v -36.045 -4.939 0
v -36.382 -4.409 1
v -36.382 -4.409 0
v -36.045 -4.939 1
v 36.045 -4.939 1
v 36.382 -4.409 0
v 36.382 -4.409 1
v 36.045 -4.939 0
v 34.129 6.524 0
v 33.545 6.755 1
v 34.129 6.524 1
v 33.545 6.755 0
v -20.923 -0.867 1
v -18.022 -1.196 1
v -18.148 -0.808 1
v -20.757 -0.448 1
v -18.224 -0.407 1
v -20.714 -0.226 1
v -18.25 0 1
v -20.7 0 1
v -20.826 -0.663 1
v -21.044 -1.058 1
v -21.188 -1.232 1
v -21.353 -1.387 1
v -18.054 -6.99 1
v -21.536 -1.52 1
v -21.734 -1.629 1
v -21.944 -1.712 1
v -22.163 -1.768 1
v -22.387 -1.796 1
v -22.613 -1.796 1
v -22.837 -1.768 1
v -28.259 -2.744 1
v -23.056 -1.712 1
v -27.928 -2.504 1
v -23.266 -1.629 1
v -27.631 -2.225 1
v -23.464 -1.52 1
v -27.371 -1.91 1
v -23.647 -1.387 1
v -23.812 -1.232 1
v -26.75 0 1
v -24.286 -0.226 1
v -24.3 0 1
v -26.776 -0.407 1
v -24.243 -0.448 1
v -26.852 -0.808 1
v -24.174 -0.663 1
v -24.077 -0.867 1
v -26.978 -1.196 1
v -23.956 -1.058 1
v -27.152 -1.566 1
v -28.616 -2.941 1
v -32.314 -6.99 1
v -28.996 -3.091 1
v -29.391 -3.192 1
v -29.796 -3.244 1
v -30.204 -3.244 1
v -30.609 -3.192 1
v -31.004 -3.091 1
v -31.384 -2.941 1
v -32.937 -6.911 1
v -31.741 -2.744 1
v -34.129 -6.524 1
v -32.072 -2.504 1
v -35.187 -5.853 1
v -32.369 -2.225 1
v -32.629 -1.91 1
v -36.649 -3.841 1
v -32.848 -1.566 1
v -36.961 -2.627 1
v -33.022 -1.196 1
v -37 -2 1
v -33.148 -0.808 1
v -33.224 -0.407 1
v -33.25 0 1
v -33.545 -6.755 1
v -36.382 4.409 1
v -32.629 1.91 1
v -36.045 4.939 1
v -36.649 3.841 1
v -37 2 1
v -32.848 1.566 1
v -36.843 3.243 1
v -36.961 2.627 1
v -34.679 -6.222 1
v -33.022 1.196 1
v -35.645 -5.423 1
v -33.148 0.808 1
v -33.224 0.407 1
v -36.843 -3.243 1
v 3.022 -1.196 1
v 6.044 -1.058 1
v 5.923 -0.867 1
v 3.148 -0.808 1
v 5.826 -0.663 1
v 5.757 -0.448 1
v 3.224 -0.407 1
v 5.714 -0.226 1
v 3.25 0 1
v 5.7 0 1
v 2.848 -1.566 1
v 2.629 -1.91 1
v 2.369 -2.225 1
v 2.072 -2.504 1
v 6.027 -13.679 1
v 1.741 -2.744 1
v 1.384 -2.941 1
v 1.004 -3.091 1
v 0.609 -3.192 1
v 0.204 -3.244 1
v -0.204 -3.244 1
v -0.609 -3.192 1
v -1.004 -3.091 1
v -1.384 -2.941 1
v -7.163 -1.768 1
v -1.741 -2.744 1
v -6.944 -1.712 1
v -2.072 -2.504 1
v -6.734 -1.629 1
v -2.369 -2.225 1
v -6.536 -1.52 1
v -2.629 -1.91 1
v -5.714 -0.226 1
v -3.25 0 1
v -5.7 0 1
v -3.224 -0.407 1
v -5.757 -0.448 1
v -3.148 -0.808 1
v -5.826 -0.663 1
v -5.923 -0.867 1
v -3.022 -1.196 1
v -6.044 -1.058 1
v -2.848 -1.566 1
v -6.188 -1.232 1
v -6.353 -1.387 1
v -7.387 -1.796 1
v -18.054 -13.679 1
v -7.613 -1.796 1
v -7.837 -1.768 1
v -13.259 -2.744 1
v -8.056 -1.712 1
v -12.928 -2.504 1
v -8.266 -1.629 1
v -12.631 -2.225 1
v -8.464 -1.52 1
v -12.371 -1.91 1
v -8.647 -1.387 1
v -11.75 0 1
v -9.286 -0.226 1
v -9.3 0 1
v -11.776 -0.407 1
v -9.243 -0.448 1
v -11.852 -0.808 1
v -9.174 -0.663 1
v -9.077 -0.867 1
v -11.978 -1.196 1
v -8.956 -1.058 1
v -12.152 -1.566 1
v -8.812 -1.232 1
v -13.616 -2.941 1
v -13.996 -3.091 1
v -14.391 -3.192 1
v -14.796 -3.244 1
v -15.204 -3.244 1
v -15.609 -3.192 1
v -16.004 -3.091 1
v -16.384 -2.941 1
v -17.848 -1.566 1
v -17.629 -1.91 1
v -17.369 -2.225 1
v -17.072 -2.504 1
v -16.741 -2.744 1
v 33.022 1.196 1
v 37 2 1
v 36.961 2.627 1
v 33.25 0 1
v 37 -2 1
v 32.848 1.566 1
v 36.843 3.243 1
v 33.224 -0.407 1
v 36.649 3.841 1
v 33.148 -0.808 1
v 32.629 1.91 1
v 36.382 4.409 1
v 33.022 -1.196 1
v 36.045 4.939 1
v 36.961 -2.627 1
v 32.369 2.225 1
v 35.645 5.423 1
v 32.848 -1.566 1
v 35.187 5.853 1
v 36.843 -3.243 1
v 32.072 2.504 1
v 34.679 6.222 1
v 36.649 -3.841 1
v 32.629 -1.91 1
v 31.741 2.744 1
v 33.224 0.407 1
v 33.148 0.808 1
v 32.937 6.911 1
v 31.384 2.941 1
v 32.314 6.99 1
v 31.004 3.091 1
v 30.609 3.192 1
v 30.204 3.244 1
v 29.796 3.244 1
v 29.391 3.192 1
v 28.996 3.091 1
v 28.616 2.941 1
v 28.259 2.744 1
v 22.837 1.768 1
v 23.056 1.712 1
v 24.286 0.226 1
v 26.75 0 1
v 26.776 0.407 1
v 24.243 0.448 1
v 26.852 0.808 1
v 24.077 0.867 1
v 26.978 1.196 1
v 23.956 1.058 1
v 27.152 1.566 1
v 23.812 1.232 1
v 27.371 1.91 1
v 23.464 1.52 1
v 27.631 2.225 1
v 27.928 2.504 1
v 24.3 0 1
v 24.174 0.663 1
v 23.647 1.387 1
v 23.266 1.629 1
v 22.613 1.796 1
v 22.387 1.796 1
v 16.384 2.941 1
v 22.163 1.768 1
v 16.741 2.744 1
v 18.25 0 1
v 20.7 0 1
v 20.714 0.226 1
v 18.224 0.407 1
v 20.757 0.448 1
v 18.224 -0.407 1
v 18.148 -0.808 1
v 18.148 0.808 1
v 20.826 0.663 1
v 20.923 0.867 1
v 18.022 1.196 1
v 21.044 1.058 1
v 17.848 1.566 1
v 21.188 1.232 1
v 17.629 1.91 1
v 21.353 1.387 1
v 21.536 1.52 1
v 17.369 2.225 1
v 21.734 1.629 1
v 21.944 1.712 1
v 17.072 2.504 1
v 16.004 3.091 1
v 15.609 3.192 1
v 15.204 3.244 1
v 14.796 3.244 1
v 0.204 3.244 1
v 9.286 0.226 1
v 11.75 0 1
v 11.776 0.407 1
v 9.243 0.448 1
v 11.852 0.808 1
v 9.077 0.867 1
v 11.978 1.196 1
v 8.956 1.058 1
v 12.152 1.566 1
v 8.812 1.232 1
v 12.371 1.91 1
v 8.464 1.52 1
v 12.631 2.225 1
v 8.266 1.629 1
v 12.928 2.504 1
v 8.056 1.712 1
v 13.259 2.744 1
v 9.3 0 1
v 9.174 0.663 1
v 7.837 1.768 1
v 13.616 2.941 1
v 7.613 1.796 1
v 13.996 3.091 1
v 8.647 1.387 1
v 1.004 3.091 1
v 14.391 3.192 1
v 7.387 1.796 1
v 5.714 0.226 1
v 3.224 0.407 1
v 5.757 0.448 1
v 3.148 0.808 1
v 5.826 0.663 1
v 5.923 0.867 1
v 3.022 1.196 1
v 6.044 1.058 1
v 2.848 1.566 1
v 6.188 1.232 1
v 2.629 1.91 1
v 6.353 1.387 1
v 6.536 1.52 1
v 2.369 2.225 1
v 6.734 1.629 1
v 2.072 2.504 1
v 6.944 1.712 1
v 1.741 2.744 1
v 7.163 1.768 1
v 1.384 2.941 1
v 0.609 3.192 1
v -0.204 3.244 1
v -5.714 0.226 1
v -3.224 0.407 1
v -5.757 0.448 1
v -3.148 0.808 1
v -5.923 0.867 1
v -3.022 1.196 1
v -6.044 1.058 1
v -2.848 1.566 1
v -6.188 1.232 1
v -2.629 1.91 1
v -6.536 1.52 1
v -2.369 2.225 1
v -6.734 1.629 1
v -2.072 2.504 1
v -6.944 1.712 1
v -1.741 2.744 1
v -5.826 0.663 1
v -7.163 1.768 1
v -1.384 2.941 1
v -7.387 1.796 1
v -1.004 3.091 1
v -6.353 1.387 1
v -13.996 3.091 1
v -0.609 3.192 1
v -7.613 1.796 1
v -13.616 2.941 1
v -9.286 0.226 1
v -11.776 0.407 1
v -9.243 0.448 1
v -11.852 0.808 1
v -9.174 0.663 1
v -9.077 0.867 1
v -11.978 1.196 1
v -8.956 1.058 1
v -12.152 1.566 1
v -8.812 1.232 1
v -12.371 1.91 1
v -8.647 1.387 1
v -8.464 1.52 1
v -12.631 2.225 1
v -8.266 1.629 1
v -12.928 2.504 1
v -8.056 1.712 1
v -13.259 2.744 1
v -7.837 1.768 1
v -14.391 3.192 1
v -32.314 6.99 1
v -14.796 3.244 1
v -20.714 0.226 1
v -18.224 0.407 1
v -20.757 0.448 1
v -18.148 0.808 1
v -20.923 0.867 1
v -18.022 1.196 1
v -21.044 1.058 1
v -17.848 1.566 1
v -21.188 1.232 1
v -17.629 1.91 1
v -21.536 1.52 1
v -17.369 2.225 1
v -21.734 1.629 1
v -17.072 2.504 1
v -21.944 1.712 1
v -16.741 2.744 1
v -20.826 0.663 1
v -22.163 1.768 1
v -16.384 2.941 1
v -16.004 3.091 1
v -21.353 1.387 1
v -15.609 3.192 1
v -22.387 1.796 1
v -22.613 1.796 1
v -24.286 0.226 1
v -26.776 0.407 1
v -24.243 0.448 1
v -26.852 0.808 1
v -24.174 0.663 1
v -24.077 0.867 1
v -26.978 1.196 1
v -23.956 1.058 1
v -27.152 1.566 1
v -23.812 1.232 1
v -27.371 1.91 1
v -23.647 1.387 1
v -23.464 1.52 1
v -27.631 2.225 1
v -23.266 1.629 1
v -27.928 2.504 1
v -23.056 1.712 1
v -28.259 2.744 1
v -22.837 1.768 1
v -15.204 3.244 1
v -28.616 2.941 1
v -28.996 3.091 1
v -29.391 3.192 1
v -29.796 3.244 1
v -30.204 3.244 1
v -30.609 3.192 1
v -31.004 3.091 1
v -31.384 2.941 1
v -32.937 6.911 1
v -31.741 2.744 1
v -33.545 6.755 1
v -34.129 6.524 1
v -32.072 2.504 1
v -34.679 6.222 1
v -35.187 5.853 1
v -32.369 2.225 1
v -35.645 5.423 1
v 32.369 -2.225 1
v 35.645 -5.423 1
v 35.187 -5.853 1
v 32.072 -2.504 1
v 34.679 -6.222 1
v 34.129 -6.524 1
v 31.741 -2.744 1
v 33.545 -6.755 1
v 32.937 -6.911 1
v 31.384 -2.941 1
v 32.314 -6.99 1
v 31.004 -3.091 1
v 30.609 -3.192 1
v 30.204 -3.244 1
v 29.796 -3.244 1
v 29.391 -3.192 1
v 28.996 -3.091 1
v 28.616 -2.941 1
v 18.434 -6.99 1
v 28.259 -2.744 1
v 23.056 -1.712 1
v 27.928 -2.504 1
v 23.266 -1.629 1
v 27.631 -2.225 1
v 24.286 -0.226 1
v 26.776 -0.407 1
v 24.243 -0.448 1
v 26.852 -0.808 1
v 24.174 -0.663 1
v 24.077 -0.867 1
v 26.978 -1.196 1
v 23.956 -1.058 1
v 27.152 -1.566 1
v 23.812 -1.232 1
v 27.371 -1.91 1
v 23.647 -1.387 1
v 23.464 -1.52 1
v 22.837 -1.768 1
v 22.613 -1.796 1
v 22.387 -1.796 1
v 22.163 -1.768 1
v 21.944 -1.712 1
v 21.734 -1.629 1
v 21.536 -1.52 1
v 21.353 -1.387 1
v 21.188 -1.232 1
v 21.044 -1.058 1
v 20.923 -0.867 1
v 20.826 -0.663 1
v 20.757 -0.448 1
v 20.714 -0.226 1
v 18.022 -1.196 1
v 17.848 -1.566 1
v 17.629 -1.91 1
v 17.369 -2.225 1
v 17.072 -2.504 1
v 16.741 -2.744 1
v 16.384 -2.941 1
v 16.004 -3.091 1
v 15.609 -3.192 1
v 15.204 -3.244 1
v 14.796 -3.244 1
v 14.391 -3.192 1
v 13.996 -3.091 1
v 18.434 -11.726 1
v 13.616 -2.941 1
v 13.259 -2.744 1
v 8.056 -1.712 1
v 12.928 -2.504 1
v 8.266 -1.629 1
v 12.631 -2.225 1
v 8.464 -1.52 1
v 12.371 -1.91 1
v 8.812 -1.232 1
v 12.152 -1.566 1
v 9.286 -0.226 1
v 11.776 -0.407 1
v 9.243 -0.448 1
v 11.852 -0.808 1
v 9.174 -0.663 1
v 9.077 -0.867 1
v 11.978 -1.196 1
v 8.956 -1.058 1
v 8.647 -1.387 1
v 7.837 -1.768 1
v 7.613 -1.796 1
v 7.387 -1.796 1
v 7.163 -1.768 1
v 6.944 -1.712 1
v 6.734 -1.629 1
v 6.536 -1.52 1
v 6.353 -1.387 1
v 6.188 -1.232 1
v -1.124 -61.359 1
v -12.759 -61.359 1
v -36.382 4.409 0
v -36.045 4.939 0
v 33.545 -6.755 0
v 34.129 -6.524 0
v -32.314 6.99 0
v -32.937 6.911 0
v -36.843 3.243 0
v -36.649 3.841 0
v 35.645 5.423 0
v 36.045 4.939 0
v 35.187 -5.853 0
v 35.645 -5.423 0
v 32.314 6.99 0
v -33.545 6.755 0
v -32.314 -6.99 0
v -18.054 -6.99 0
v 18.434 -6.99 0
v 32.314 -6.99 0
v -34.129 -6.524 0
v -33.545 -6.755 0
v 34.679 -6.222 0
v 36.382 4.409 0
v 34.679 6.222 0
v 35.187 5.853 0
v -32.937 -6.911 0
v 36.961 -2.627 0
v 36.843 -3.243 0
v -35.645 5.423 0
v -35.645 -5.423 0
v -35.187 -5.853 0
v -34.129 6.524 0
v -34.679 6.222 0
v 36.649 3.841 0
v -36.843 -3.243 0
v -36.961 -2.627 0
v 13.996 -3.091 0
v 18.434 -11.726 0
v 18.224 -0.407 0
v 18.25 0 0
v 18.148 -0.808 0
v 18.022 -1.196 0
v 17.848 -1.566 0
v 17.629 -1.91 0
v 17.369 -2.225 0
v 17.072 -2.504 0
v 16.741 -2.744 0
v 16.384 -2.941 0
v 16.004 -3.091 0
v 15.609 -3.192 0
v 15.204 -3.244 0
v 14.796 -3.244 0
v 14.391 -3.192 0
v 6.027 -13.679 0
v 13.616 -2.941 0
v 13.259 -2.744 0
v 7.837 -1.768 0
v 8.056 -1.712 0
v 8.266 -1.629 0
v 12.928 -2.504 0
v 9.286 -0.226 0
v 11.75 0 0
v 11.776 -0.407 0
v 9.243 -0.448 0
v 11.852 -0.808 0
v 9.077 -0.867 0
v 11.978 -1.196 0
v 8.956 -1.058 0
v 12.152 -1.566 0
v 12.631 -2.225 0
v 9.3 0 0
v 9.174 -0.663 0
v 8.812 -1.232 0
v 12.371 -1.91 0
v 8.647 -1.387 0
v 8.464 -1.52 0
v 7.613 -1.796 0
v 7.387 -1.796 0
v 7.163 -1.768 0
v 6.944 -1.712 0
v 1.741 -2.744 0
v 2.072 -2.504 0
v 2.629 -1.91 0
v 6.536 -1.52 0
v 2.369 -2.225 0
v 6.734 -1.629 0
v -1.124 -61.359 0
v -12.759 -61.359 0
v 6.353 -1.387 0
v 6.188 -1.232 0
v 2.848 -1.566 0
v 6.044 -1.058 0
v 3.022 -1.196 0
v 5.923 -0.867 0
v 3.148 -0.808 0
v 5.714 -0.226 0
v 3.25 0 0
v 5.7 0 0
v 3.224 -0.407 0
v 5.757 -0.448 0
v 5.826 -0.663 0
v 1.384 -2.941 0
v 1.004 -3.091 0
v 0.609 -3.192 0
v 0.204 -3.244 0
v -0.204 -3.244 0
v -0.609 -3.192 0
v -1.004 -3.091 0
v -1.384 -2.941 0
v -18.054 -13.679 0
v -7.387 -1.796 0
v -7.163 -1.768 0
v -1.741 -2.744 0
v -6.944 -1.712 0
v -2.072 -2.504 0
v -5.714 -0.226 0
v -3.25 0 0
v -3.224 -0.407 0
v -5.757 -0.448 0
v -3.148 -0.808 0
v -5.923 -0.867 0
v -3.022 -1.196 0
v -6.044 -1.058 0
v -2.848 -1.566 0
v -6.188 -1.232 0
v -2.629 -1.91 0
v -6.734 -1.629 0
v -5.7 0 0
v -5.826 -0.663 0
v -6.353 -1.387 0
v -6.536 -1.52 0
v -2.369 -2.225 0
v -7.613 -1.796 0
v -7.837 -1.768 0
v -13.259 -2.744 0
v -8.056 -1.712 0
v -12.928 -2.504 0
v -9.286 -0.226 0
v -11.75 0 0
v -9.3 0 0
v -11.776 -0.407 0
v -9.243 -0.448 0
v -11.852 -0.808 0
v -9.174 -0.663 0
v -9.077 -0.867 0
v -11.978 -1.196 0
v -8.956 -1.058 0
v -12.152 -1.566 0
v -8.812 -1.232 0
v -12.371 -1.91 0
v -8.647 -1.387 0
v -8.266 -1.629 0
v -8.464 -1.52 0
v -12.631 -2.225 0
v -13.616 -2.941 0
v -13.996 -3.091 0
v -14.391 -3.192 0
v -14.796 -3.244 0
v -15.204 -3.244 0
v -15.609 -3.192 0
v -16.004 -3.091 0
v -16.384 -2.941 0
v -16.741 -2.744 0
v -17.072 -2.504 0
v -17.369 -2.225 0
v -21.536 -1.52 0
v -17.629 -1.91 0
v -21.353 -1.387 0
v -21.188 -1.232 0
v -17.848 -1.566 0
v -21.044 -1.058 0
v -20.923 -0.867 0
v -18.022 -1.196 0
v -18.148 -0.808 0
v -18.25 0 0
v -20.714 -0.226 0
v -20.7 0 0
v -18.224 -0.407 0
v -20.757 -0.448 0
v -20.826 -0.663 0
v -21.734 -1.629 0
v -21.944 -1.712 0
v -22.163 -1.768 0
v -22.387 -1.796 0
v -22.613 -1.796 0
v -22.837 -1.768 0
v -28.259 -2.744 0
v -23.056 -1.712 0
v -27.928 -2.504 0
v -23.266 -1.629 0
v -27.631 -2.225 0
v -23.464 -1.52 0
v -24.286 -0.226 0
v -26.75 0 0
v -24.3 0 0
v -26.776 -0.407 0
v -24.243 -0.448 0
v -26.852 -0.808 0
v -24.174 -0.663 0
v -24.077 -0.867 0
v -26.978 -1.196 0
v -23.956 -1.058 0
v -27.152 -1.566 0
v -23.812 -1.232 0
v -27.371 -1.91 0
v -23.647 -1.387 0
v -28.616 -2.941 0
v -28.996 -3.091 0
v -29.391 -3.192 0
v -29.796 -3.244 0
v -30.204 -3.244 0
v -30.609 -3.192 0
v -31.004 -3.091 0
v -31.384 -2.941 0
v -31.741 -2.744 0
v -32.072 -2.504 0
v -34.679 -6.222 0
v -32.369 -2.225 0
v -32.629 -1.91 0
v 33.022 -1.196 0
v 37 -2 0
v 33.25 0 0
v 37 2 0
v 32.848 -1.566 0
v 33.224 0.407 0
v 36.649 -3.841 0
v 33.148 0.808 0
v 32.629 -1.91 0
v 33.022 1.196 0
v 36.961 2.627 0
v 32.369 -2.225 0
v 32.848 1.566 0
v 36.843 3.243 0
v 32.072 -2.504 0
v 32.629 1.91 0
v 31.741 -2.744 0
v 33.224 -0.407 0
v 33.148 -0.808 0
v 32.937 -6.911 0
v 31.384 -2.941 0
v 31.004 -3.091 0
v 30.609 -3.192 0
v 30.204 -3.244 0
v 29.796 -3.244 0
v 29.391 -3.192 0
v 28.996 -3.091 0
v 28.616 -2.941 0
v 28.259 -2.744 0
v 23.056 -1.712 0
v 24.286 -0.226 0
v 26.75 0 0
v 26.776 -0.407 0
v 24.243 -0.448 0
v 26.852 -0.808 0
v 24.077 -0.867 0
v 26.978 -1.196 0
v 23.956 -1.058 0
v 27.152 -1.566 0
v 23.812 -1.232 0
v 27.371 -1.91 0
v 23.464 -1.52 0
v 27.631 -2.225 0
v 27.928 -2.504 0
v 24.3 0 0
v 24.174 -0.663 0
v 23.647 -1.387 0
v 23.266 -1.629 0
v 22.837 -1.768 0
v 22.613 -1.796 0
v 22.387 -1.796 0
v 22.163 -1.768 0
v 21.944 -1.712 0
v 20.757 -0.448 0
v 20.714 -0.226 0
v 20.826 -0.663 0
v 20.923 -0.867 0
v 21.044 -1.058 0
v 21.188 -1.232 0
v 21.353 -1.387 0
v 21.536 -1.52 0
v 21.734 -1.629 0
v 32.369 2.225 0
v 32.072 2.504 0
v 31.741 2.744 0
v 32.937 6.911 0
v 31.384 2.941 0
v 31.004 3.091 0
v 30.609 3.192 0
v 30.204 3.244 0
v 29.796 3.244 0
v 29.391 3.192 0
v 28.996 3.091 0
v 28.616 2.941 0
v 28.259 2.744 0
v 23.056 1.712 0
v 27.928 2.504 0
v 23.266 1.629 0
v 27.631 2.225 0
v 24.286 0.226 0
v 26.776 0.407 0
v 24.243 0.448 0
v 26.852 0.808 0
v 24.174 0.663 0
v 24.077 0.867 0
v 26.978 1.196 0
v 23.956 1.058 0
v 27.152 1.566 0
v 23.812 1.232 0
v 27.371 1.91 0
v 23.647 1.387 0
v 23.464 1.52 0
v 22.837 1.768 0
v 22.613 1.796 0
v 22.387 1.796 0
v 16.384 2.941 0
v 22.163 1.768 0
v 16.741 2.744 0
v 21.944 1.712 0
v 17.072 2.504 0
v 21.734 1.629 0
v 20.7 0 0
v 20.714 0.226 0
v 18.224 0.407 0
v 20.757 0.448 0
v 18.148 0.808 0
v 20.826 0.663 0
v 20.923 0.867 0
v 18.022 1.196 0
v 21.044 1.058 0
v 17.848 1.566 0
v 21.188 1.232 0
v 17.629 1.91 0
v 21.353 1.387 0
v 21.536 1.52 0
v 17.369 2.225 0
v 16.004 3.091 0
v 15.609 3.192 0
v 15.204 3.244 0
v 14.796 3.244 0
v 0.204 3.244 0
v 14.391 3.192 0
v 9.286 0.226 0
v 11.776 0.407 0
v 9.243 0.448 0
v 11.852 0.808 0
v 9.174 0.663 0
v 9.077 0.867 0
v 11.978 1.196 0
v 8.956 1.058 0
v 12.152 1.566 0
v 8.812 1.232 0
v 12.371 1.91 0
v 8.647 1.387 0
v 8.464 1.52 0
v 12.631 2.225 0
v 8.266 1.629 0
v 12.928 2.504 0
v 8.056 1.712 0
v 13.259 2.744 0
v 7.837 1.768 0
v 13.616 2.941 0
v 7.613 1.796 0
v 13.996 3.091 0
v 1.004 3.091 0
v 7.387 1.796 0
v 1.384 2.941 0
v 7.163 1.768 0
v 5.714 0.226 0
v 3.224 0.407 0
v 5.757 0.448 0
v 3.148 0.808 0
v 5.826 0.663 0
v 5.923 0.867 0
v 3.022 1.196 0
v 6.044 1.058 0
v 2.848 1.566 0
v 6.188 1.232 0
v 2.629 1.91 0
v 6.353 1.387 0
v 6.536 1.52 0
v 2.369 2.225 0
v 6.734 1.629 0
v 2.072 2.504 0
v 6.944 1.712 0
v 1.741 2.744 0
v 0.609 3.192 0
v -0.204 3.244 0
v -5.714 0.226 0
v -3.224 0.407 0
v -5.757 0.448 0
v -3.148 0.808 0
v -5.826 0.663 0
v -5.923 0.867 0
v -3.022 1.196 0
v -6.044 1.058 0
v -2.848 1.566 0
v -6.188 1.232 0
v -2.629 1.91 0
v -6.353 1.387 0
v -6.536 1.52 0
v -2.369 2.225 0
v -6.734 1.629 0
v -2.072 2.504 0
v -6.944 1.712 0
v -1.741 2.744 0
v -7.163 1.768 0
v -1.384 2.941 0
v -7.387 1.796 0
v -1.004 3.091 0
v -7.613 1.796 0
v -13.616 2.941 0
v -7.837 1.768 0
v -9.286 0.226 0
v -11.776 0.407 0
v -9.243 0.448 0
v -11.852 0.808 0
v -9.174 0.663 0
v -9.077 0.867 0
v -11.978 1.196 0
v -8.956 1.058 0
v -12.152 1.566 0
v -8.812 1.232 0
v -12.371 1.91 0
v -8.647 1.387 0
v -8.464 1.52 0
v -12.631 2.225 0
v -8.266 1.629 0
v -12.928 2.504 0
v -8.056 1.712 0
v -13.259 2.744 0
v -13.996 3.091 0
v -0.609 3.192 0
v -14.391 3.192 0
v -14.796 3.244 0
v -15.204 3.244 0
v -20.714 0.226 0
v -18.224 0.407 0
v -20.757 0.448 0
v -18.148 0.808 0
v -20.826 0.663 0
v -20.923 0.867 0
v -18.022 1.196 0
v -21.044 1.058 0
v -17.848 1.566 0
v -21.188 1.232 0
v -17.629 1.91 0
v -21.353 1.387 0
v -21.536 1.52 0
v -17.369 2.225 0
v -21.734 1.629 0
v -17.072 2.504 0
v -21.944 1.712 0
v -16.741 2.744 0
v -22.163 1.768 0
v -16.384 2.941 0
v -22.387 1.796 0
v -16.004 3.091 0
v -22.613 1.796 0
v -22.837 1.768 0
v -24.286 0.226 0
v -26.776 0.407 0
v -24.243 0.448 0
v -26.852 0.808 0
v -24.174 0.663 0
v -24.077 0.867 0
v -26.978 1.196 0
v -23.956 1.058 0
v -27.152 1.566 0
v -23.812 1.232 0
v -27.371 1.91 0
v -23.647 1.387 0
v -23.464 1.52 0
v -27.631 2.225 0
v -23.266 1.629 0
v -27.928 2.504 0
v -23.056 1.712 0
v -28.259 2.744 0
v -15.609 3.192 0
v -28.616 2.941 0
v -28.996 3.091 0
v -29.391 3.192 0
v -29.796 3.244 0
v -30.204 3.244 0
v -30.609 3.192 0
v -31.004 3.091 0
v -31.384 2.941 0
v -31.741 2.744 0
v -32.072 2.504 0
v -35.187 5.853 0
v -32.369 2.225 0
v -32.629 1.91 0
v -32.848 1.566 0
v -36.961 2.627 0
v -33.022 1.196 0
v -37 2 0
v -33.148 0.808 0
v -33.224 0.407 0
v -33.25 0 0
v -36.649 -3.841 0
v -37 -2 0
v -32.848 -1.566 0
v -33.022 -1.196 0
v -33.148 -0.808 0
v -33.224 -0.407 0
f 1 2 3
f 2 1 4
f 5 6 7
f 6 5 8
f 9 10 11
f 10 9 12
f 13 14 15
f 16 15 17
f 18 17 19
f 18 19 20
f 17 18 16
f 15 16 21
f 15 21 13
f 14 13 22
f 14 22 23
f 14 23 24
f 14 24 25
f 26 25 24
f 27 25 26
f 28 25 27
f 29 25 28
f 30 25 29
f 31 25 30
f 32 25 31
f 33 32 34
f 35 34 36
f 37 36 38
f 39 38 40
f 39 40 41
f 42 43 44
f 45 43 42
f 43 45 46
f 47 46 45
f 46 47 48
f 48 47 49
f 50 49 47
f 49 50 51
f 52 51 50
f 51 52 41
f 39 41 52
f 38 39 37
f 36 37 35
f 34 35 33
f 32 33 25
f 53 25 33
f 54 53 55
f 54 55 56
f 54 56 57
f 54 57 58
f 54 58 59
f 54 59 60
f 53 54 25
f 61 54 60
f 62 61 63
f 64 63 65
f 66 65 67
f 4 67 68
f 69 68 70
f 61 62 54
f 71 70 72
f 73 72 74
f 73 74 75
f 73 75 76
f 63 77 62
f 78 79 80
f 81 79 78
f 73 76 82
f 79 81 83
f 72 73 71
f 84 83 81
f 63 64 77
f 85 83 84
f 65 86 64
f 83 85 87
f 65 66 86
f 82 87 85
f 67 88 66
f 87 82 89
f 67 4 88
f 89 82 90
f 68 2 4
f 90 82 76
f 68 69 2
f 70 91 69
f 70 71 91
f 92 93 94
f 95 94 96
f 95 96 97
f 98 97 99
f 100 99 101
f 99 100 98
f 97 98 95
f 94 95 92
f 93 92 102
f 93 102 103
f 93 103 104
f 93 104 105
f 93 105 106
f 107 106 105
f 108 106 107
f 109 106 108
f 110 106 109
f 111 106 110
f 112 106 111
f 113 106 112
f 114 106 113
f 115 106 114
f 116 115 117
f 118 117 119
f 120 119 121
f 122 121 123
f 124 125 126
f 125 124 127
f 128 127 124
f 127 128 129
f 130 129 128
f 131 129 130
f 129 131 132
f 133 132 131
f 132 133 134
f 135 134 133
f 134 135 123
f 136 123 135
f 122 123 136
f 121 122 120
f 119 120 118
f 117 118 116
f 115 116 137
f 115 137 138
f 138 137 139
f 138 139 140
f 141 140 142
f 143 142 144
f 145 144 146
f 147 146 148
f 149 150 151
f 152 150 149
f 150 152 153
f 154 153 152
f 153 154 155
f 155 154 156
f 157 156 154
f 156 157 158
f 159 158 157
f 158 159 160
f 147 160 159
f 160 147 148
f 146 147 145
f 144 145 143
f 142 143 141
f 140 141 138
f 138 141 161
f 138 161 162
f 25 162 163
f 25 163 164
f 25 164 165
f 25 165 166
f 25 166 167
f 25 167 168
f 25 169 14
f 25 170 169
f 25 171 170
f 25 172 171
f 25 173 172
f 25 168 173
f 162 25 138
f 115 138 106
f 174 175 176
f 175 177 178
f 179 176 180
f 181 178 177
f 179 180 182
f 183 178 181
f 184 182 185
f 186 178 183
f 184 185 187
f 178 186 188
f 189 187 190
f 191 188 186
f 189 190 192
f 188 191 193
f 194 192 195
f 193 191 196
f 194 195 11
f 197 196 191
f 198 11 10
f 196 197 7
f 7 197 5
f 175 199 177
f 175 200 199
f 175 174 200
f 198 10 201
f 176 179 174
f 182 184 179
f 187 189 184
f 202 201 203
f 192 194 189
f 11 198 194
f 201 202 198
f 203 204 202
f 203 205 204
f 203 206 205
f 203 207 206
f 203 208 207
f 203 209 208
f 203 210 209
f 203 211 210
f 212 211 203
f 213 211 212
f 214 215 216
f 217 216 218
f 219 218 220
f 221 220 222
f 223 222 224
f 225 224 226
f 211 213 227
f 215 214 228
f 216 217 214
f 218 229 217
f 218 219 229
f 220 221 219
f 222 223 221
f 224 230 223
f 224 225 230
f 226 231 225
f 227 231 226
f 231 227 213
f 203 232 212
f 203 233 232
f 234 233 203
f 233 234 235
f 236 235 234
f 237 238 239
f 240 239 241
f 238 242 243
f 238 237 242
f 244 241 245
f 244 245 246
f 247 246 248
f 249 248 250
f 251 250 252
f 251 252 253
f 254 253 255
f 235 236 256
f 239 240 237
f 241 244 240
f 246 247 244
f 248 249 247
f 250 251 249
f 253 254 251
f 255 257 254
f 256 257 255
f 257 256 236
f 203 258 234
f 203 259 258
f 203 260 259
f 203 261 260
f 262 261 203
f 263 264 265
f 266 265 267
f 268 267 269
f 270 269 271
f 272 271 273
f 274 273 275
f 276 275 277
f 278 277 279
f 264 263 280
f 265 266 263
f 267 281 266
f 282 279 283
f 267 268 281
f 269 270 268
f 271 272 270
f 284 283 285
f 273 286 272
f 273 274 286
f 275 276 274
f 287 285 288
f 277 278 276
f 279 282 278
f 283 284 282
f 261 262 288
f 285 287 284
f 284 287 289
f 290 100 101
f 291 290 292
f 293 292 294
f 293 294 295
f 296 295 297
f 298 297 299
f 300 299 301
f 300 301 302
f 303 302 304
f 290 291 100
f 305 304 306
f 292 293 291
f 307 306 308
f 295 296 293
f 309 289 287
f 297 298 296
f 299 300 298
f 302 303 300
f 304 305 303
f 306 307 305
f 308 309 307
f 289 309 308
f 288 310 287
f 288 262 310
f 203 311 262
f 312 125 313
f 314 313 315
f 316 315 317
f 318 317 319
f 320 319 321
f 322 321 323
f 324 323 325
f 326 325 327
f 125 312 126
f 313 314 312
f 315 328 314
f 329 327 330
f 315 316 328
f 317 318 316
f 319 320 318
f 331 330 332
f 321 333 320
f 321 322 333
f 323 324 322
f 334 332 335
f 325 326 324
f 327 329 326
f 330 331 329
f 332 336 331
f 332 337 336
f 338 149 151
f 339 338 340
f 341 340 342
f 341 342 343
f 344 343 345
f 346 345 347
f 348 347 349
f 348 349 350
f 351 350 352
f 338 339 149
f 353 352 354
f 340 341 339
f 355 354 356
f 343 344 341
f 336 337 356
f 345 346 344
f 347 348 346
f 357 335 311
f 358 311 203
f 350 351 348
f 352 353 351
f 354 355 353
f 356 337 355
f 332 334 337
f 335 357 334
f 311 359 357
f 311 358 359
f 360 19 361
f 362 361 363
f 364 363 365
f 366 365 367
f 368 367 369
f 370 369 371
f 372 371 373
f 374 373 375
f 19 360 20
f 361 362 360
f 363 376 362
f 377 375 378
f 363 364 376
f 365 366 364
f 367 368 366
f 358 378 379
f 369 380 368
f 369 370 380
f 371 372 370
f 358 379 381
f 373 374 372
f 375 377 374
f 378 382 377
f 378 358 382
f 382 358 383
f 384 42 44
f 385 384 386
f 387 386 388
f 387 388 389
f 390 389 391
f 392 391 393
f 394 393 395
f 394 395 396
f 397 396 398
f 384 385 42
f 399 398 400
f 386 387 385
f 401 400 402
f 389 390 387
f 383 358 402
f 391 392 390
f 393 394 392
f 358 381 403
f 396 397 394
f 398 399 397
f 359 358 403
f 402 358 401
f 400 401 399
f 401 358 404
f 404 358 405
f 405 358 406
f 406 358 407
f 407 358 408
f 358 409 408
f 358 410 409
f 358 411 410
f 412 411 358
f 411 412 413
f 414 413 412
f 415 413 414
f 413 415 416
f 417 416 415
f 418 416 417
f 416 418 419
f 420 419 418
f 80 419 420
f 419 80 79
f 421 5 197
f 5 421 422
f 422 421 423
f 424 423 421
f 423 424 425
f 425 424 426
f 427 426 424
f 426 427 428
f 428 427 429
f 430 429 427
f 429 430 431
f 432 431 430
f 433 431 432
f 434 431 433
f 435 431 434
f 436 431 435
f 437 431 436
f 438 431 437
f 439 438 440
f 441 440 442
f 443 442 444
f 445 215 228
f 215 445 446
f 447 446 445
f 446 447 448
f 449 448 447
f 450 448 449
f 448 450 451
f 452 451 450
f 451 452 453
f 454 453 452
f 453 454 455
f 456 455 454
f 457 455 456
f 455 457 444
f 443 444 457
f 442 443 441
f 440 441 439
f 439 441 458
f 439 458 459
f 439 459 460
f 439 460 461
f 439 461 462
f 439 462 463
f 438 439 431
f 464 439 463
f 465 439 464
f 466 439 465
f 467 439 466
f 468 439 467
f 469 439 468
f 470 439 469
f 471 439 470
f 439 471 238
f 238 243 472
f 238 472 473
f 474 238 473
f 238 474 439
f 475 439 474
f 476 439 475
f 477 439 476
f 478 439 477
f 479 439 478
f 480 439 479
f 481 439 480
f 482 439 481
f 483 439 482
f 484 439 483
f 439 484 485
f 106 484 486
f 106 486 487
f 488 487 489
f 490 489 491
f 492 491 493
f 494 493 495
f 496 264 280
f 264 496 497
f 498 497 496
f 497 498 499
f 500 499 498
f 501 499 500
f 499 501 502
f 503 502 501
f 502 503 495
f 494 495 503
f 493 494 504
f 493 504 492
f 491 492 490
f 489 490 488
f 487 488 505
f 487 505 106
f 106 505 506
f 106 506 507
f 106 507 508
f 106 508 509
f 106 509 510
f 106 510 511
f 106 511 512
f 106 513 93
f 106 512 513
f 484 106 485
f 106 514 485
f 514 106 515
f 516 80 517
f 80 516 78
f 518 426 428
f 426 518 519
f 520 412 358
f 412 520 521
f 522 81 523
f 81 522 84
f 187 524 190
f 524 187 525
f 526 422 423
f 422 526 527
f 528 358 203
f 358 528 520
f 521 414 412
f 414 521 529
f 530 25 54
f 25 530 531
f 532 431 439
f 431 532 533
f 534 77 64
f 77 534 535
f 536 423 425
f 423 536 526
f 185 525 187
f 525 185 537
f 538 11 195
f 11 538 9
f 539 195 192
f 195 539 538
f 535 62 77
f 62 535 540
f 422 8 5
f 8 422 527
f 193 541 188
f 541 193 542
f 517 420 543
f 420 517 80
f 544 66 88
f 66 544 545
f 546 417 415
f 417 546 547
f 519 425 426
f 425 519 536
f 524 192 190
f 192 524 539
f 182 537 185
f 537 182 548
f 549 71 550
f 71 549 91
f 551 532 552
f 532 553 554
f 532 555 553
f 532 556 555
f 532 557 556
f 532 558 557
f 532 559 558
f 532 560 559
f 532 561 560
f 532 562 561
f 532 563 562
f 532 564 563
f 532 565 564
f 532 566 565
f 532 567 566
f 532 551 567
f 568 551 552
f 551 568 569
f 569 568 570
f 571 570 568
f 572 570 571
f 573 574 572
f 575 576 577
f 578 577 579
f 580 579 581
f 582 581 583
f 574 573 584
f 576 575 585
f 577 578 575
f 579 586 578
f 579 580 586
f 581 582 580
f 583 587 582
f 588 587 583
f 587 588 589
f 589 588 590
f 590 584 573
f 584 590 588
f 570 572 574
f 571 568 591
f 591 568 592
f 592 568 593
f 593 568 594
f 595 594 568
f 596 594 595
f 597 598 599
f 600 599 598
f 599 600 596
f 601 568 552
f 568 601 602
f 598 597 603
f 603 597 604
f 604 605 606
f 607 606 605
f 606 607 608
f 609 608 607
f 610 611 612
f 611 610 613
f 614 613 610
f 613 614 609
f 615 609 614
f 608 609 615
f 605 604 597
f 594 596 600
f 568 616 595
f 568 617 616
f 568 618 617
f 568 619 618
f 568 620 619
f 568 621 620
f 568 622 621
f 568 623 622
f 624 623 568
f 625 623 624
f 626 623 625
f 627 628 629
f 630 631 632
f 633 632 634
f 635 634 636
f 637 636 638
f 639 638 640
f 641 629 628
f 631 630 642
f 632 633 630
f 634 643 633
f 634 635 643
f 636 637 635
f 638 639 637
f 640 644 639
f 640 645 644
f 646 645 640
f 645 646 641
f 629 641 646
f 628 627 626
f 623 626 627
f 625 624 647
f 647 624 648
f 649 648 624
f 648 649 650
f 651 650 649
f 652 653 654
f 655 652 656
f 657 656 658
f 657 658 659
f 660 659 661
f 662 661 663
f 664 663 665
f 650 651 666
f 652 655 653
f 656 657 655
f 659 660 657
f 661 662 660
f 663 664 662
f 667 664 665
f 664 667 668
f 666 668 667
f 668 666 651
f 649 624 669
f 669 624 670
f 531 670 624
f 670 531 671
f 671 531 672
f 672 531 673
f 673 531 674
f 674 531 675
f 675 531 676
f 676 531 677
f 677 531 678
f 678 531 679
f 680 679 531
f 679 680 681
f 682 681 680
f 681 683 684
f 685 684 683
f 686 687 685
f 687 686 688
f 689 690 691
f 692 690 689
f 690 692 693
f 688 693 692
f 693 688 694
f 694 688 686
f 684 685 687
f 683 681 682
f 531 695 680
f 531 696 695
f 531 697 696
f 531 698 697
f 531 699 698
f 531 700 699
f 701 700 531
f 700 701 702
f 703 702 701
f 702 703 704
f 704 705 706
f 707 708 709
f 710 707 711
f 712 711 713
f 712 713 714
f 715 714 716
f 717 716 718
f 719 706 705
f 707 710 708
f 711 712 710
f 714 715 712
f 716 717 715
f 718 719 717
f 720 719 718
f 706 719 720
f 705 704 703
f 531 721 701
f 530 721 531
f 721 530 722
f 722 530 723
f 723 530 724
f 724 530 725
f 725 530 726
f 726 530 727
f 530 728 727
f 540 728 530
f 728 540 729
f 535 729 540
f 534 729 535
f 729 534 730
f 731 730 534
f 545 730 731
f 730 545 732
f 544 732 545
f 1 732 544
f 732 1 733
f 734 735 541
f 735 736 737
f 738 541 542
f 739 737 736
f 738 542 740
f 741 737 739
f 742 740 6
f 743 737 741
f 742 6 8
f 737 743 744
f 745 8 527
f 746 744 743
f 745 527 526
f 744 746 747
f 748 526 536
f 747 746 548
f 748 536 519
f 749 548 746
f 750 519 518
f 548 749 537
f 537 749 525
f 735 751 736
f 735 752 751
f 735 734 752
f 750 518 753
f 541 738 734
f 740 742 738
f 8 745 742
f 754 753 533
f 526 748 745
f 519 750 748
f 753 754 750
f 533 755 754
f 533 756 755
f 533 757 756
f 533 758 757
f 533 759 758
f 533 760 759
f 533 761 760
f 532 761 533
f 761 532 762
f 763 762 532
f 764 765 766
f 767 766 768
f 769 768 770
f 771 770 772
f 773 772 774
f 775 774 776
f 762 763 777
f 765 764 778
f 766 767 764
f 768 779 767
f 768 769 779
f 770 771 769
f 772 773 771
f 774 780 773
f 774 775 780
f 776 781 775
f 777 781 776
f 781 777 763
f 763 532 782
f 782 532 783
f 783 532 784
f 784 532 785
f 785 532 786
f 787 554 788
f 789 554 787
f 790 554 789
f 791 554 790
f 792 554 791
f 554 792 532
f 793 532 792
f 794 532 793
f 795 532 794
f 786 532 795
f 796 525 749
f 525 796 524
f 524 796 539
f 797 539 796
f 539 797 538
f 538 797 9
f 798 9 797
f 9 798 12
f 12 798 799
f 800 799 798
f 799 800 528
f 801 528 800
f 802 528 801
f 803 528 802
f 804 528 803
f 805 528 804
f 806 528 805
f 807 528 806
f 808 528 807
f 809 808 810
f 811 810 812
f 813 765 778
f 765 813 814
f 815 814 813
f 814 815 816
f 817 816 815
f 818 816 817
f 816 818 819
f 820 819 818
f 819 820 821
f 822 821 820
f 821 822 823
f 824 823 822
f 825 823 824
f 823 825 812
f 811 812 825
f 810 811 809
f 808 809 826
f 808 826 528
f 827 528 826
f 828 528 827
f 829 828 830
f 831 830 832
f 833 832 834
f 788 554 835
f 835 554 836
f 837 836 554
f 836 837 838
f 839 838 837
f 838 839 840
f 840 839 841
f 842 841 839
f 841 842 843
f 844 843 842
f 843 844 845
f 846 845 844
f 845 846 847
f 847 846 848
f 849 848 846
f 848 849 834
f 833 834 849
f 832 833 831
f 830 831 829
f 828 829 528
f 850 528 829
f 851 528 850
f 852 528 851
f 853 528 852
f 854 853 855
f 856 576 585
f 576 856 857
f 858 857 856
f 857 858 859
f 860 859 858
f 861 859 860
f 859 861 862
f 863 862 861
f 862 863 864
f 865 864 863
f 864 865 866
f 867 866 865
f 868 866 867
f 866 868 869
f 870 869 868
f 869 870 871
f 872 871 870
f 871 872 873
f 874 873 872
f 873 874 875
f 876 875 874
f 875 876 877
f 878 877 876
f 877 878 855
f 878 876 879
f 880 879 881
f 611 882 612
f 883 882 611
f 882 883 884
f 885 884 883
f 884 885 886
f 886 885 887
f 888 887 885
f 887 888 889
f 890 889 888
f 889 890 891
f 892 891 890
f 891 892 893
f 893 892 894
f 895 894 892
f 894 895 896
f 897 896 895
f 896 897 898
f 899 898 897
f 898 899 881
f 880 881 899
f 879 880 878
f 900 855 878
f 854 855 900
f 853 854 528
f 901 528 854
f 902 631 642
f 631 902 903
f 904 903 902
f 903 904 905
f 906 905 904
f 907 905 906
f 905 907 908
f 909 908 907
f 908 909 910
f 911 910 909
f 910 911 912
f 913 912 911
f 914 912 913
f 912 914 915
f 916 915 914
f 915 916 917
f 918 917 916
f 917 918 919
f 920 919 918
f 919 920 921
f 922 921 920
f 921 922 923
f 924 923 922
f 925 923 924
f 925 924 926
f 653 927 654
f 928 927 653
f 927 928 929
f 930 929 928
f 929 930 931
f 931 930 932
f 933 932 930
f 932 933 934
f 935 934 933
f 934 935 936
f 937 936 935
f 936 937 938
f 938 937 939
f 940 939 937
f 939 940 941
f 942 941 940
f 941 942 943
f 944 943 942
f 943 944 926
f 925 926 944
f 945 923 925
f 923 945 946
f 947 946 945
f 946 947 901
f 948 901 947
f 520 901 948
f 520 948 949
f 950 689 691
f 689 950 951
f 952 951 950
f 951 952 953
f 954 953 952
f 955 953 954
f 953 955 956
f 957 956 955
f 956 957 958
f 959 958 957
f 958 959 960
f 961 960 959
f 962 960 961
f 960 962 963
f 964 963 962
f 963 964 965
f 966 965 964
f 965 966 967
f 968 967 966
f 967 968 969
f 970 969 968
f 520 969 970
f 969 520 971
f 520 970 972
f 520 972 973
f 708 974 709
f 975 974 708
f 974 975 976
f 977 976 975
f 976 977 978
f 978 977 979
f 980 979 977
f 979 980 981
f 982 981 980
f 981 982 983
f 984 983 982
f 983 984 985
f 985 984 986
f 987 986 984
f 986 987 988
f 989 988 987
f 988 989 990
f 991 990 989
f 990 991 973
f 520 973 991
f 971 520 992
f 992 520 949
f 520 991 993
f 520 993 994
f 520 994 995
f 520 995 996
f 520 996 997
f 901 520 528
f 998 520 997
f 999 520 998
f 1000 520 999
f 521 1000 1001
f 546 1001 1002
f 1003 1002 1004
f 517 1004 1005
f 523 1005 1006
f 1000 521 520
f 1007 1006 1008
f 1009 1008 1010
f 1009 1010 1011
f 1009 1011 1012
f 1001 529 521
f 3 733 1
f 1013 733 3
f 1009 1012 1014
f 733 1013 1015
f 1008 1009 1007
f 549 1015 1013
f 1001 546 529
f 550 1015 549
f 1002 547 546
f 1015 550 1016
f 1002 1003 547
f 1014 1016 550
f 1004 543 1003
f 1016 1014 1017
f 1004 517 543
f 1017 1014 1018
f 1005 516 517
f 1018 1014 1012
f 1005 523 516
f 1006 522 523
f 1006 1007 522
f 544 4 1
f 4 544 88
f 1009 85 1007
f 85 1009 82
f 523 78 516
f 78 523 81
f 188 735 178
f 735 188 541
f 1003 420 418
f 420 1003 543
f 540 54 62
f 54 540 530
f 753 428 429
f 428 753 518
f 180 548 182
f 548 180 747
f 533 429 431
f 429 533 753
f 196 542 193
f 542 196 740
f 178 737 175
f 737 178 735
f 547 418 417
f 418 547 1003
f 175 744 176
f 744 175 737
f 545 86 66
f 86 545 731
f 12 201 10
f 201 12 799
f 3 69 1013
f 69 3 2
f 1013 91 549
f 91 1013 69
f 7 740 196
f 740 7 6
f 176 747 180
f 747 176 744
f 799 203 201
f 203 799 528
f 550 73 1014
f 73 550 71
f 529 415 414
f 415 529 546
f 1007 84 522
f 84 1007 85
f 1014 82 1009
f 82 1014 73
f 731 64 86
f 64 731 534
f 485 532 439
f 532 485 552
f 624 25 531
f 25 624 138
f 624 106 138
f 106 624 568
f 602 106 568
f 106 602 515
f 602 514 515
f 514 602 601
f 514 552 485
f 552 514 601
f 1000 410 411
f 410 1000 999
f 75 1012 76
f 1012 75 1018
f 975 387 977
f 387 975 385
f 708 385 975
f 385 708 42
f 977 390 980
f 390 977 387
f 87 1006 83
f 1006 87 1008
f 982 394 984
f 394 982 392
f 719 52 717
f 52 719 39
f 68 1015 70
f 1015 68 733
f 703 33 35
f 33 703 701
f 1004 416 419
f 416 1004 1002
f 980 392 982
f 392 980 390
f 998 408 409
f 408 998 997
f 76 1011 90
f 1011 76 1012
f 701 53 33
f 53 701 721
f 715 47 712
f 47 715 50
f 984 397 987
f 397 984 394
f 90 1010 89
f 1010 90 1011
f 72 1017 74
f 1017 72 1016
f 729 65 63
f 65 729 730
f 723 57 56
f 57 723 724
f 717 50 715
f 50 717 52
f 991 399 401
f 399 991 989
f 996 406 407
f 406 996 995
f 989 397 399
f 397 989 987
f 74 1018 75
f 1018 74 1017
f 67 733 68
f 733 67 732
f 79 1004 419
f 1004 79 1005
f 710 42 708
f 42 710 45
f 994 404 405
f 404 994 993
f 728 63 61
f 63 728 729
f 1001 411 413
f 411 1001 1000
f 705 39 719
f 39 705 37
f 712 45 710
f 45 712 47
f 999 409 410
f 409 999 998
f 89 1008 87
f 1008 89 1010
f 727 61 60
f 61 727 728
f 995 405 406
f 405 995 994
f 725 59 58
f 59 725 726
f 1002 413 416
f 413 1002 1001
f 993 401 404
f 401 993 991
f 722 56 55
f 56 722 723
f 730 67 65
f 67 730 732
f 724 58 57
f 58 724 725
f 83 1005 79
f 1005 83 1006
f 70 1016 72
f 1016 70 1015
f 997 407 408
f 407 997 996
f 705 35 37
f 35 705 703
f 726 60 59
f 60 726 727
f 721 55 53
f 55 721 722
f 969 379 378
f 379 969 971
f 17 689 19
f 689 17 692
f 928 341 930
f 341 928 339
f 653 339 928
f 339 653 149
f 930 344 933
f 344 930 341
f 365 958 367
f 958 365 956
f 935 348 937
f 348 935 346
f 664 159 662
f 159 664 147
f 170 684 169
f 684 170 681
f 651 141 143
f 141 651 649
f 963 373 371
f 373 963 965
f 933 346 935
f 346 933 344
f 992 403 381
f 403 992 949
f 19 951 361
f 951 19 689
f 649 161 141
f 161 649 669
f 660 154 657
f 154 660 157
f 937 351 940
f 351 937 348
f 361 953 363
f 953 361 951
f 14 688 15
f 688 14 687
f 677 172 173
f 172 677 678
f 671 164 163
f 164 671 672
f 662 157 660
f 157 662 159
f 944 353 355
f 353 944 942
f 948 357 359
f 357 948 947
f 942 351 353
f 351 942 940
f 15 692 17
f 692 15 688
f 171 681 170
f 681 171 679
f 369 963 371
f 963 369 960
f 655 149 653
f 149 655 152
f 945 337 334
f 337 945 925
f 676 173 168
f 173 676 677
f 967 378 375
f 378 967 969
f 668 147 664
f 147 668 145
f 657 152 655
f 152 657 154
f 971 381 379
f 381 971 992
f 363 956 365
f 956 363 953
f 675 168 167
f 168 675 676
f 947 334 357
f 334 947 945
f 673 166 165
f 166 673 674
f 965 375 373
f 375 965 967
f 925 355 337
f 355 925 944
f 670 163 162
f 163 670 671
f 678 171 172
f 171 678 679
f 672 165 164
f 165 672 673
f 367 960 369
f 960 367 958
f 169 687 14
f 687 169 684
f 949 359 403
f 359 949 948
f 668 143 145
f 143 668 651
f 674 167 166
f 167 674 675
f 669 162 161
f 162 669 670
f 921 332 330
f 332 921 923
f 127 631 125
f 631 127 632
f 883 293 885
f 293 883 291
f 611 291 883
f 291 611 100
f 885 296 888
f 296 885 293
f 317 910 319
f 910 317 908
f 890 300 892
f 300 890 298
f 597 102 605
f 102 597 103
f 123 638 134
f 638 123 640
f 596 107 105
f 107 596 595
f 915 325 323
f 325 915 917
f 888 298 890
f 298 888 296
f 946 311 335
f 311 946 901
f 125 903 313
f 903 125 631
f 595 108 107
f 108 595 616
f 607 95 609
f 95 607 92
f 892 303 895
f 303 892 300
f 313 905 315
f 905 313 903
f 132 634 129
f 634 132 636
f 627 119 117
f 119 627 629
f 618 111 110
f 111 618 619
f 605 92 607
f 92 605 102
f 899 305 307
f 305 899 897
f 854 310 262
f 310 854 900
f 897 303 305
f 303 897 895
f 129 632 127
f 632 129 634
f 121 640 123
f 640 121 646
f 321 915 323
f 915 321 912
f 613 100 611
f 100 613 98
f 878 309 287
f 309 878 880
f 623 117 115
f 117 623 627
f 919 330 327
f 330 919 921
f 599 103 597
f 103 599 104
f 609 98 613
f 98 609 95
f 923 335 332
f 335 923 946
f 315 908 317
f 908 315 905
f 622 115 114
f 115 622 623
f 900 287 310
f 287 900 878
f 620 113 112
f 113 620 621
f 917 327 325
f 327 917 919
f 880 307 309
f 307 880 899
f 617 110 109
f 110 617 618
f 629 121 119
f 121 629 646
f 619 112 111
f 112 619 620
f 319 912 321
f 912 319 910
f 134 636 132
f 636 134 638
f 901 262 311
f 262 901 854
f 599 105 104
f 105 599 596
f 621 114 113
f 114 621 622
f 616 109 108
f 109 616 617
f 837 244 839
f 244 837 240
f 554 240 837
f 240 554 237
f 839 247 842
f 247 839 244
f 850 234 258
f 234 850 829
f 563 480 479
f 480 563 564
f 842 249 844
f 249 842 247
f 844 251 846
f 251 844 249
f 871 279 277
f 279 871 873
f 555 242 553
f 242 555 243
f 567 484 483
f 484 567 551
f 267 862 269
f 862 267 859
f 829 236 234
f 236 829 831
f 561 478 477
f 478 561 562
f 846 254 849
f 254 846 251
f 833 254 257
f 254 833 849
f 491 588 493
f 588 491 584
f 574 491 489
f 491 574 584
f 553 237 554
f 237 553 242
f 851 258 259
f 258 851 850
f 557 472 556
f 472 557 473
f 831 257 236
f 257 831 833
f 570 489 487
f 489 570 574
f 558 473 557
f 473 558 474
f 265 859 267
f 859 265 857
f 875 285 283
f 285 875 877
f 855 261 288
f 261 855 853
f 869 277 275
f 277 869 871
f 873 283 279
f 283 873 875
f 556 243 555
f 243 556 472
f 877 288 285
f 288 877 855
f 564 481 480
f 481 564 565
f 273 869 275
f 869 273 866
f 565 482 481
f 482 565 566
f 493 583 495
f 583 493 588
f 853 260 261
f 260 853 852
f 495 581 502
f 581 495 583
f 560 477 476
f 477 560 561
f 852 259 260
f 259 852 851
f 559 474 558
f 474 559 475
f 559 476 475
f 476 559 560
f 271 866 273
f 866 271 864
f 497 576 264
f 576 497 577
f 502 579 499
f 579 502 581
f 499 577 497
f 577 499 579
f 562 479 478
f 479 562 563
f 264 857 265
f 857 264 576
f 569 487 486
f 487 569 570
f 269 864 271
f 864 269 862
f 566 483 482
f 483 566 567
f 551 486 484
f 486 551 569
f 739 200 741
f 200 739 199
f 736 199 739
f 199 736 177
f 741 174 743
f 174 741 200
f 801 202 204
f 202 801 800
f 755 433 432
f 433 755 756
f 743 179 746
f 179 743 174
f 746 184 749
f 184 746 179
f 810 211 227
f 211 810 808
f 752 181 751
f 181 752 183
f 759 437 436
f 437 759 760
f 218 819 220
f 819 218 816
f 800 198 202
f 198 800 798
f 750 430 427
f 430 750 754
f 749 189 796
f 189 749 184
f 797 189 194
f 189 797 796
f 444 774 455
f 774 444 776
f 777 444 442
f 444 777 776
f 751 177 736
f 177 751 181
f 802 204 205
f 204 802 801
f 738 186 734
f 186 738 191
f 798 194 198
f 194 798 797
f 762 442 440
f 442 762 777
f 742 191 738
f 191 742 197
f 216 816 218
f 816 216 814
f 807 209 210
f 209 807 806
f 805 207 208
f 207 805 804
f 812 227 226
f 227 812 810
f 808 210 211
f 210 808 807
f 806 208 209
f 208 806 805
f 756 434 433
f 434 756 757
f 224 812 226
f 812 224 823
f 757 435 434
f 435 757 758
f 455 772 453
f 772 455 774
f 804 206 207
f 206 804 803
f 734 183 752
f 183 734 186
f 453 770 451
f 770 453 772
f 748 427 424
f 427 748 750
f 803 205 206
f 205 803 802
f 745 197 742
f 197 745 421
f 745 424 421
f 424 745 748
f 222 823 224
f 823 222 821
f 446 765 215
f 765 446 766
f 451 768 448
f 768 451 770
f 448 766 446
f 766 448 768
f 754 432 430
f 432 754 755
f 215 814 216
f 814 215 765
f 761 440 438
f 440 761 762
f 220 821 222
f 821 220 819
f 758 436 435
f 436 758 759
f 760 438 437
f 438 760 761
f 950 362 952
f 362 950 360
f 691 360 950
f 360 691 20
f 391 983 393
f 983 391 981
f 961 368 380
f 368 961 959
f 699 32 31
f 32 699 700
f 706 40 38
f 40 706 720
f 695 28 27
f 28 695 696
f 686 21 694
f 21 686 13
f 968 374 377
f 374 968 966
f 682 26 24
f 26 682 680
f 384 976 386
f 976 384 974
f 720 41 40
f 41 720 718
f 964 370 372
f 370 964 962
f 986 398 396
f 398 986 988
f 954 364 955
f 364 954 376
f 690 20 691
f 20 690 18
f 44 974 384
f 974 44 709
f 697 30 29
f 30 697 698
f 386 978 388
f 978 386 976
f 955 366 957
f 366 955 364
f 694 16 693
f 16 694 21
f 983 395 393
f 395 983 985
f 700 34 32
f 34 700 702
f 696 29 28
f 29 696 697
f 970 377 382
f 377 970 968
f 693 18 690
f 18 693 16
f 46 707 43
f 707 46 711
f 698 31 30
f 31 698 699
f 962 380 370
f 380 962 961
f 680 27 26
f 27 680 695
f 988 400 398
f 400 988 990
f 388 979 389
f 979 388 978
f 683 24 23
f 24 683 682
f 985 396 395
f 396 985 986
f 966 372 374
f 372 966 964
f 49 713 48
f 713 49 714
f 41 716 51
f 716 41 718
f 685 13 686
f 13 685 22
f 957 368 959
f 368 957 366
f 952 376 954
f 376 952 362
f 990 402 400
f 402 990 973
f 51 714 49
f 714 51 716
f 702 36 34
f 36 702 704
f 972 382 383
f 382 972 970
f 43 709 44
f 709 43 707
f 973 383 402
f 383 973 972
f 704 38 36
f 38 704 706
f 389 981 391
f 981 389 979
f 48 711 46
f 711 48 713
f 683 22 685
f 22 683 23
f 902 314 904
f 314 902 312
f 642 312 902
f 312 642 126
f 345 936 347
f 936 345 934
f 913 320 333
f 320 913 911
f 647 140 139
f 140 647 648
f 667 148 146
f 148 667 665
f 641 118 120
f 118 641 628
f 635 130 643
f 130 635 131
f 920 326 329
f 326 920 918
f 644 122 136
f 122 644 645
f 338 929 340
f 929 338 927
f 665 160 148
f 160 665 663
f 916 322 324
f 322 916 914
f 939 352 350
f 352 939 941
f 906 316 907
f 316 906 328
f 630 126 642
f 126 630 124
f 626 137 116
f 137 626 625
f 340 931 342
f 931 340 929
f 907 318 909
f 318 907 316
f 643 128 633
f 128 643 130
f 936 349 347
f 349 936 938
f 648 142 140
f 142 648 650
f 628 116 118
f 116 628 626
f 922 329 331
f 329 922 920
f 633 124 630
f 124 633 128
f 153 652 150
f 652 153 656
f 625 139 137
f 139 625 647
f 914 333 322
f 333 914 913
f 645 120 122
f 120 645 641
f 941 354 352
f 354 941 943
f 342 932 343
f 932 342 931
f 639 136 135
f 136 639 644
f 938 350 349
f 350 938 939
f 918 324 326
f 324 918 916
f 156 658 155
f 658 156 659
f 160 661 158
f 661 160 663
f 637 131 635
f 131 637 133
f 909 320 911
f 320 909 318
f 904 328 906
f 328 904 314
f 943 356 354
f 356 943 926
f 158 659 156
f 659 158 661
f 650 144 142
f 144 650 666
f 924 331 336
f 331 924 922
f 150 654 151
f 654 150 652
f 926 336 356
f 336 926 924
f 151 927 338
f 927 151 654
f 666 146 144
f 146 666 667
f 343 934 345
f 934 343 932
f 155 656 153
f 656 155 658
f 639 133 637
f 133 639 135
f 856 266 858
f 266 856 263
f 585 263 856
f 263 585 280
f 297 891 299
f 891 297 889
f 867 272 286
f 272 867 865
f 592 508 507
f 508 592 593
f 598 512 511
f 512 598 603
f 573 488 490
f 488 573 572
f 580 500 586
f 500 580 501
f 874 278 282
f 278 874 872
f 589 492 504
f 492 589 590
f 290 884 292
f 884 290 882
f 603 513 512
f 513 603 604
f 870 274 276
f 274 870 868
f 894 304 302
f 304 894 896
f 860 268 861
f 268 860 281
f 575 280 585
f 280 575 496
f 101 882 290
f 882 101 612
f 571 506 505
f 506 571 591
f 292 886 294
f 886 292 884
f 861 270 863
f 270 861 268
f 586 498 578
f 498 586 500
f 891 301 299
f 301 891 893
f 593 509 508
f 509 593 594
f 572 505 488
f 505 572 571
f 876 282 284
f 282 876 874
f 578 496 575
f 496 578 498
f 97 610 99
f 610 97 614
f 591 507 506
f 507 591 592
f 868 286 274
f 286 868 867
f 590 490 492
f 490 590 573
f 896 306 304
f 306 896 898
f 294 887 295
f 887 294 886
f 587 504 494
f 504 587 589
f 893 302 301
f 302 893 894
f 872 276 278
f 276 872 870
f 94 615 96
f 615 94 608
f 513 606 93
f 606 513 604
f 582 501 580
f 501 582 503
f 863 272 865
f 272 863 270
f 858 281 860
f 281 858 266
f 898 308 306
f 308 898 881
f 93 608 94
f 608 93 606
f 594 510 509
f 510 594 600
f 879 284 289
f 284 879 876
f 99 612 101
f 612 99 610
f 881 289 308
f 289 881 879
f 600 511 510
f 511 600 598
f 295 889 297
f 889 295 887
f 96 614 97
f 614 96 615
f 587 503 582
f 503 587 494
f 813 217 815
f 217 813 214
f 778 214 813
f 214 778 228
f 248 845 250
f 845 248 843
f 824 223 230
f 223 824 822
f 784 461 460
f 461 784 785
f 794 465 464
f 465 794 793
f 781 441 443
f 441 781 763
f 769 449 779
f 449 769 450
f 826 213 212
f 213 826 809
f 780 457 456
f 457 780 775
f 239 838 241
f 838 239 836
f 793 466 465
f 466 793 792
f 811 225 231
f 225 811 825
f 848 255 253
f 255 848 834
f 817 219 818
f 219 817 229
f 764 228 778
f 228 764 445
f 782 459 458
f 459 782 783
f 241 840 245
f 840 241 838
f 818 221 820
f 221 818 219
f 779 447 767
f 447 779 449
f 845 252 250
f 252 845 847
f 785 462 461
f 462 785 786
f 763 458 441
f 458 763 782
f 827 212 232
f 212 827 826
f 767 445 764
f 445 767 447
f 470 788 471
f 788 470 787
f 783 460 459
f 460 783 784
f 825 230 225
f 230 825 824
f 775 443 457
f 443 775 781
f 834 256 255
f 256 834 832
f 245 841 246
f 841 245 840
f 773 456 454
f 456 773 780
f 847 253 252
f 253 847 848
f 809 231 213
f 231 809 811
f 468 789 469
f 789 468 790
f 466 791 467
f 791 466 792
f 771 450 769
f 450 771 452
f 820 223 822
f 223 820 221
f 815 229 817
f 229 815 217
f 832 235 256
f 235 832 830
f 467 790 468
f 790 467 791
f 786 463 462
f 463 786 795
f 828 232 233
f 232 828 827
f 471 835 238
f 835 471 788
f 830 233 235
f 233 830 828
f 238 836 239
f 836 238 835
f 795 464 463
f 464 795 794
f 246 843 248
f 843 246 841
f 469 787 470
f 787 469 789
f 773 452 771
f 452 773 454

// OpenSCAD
$fn = 50;


difference() {
	union() {
		*color(alpha = 1.0000000000, c = "gray") {
			translate(v = [0, 14, 0]) {
				linear_extrude(height = 1) {
					text(font = "Arial:style=Bold", halign = "center", size = 4.5000000000, text = "COMMENT description oobb_plate_shape_p_type_1_depth_5_width_1_thickness_7_extra_oobb_size", valign = "center");
				}
			}
		}
		hull() {
			translate(v = [-32.0000000000, 2.0000000000, 0]) {
				cylinder(h = 1, r = 5);
			}
			translate(v = [32.0000000000, 2.0000000000, 0]) {
				cylinder(h = 1, r = 5);
			}
			translate(v = [-32.0000000000, -2.0000000000, 0]) {
				cylinder(h = 1, r = 5);
			}
			translate(v = [32.0000000000, -2.0000000000, 0]) {
				cylinder(h = 1, r = 5);
			}
		}
		translate(v = [0, -5, 0]) {
			linear_extrude(height = 1) {
				text(font = "DejaVu Sans Mono:style=Bold", halign = "center", size = 57.0000000000, text = "7", valign = "top");
			}
		}
	}
	union() {
		*color(alpha = 1.0000000000, c = "gray") {
			translate(v = [0, 14, 0]) {
				linear_extrude(height = 1) {
					text(font = "Arial:style=Bold", halign = "center", size = 4.5000000000, text = "COMMENT description oobb_holes_shape_n_type_5_width_1_thickness_7_extra_oobb_size_1_height_'all'_holes_true_both_holes", valign = "center");
				}
			}
		}
		translate(v = [-30.0000000000, 0.0000000000, 0]) {
			translate(v = [0, 0, -50]) {
				cylinder(h = 100, r = 3.2500000000);
			}
		}
		translate(v = [-15.0000000000, 0.0000000000, 0]) {
			translate(v = [0, 0, -50]) {
				cylinder(h = 100, r = 3.2500000000);
			}
		}
		translate(v = [0, 0, -50]) {
			cylinder(h = 100, r = 3.2500000000);
		}
		translate(v = [15.0000000000, 0.0000000000, 0]) {
			translate(v = [0, 0, -50]) {
				cylinder(h = 100, r = 3.2500000000);
			}
		}
		translate(v = [30.0000000000, 0.0000000000, 0]) {
			translate(v = [0, 0, -50]) {
				cylinder(h = 100, r = 3.2500000000);
			}
		}
		translate(v = [-30.0000000000, 0.0000000000, 0]) {
			translate(v = [0, 0, -50]) {
				cylinder(h = 100, r = 1.8000000000);
			}
		}
		translate(v = [-22.5000000000, 0.0000000000, 0]) {
			translate(v = [0, 0, -50]) {
				cylinder(h = 100, r = 1.8000000000);
			}
		}
		translate(v = [-15.0000000000, 0.0000000000, 0]) {
			translate(v = [0, 0, -50]) {
				cylinder(h = 100, r = 1.8000000000);
			}
		}
		translate(v = [-7.5000000000, 0.0000000000, 0]) {
			translate(v = [0, 0, -50]) {
				cylinder(h = 100, r = 1.8000000000);
			}
		}
		translate(v = [0, 0, -50]) {
			cylinder(h = 100, r = 1.8000000000);
		}
		translate(v = [7.5000000000, 0.0000000000, 0]) {
			translate(v = [0, 0, -50]) {
				cylinder(h = 100, r = 1.8000000000);
			}
		}
		translate(v = [15.0000000000, 0.0000000000, 0]) {
			translate(v = [0, 0, -50]) {
				cylinder(h = 100, r = 1.8000000000);
			}
		}
		translate(v = [22.5000000000, 0.0000000000, 0]) {
			translate(v = [0, 0, -50]) {
				cylinder(h = 100, r = 1.8000000000);
			}
		}
		translate(v = [30.0000000000, 0.0000000000, 0]) {
			translate(v = [0, 0, -50]) {
				cylinder(h = 100, r = 1.8000000000);
			}
		}
	}
}
